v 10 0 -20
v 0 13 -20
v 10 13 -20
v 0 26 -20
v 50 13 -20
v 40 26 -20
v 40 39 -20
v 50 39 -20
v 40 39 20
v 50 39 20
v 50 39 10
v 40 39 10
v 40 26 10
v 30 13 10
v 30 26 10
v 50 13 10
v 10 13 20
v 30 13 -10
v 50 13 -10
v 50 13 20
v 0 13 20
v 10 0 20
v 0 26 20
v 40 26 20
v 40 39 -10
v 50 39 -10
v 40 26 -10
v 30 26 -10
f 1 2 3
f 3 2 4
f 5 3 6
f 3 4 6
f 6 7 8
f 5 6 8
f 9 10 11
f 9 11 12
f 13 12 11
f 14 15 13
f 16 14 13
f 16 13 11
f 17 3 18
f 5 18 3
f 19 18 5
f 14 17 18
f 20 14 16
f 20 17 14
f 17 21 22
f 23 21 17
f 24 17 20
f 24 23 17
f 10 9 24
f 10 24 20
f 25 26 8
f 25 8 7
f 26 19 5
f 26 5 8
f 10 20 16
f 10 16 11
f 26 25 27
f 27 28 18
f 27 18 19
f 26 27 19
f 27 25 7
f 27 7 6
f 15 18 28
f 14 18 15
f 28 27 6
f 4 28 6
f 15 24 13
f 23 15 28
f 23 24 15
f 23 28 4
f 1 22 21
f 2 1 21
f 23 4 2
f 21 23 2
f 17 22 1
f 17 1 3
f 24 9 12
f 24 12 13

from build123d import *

# Parameters (mm, degrees)
F1_DEPTH = 20
F2_W     = 20
F2_H     = 20
F3_DEPTH = 26.001
F5_DEPTH = 40.001


with BuildPart() as f1:
    # F0 (on Top) → F1 (new body, symmetric)
    with BuildSketch(Plane.XY):
        Polygon((0, 26), (0, 0), (10, 0), (10, 13), (50, 13), (50, 39), (40, 39), (40, 26), align=None)
    extrude(amount=F1_DEPTH, both=True)

    # F2 (on face) → F3 (cut, through all)
    with BuildSketch(Plane.XZ.offset(-13)):
        with Locations((40, 0)):
            Rectangle(F2_W, F2_H)
    extrude(amount=-F3_DEPTH, mode=Mode.SUBTRACT)

    # F4 (on face) → F5 (cut, through all)
    with BuildSketch(Plane.XY.offset(20)):
        Polygon((0, 0), (10, 0), (0, 13), align=None)
    extrude(amount=-F5_DEPTH, mode=Mode.SUBTRACT)


solid = f1.part
